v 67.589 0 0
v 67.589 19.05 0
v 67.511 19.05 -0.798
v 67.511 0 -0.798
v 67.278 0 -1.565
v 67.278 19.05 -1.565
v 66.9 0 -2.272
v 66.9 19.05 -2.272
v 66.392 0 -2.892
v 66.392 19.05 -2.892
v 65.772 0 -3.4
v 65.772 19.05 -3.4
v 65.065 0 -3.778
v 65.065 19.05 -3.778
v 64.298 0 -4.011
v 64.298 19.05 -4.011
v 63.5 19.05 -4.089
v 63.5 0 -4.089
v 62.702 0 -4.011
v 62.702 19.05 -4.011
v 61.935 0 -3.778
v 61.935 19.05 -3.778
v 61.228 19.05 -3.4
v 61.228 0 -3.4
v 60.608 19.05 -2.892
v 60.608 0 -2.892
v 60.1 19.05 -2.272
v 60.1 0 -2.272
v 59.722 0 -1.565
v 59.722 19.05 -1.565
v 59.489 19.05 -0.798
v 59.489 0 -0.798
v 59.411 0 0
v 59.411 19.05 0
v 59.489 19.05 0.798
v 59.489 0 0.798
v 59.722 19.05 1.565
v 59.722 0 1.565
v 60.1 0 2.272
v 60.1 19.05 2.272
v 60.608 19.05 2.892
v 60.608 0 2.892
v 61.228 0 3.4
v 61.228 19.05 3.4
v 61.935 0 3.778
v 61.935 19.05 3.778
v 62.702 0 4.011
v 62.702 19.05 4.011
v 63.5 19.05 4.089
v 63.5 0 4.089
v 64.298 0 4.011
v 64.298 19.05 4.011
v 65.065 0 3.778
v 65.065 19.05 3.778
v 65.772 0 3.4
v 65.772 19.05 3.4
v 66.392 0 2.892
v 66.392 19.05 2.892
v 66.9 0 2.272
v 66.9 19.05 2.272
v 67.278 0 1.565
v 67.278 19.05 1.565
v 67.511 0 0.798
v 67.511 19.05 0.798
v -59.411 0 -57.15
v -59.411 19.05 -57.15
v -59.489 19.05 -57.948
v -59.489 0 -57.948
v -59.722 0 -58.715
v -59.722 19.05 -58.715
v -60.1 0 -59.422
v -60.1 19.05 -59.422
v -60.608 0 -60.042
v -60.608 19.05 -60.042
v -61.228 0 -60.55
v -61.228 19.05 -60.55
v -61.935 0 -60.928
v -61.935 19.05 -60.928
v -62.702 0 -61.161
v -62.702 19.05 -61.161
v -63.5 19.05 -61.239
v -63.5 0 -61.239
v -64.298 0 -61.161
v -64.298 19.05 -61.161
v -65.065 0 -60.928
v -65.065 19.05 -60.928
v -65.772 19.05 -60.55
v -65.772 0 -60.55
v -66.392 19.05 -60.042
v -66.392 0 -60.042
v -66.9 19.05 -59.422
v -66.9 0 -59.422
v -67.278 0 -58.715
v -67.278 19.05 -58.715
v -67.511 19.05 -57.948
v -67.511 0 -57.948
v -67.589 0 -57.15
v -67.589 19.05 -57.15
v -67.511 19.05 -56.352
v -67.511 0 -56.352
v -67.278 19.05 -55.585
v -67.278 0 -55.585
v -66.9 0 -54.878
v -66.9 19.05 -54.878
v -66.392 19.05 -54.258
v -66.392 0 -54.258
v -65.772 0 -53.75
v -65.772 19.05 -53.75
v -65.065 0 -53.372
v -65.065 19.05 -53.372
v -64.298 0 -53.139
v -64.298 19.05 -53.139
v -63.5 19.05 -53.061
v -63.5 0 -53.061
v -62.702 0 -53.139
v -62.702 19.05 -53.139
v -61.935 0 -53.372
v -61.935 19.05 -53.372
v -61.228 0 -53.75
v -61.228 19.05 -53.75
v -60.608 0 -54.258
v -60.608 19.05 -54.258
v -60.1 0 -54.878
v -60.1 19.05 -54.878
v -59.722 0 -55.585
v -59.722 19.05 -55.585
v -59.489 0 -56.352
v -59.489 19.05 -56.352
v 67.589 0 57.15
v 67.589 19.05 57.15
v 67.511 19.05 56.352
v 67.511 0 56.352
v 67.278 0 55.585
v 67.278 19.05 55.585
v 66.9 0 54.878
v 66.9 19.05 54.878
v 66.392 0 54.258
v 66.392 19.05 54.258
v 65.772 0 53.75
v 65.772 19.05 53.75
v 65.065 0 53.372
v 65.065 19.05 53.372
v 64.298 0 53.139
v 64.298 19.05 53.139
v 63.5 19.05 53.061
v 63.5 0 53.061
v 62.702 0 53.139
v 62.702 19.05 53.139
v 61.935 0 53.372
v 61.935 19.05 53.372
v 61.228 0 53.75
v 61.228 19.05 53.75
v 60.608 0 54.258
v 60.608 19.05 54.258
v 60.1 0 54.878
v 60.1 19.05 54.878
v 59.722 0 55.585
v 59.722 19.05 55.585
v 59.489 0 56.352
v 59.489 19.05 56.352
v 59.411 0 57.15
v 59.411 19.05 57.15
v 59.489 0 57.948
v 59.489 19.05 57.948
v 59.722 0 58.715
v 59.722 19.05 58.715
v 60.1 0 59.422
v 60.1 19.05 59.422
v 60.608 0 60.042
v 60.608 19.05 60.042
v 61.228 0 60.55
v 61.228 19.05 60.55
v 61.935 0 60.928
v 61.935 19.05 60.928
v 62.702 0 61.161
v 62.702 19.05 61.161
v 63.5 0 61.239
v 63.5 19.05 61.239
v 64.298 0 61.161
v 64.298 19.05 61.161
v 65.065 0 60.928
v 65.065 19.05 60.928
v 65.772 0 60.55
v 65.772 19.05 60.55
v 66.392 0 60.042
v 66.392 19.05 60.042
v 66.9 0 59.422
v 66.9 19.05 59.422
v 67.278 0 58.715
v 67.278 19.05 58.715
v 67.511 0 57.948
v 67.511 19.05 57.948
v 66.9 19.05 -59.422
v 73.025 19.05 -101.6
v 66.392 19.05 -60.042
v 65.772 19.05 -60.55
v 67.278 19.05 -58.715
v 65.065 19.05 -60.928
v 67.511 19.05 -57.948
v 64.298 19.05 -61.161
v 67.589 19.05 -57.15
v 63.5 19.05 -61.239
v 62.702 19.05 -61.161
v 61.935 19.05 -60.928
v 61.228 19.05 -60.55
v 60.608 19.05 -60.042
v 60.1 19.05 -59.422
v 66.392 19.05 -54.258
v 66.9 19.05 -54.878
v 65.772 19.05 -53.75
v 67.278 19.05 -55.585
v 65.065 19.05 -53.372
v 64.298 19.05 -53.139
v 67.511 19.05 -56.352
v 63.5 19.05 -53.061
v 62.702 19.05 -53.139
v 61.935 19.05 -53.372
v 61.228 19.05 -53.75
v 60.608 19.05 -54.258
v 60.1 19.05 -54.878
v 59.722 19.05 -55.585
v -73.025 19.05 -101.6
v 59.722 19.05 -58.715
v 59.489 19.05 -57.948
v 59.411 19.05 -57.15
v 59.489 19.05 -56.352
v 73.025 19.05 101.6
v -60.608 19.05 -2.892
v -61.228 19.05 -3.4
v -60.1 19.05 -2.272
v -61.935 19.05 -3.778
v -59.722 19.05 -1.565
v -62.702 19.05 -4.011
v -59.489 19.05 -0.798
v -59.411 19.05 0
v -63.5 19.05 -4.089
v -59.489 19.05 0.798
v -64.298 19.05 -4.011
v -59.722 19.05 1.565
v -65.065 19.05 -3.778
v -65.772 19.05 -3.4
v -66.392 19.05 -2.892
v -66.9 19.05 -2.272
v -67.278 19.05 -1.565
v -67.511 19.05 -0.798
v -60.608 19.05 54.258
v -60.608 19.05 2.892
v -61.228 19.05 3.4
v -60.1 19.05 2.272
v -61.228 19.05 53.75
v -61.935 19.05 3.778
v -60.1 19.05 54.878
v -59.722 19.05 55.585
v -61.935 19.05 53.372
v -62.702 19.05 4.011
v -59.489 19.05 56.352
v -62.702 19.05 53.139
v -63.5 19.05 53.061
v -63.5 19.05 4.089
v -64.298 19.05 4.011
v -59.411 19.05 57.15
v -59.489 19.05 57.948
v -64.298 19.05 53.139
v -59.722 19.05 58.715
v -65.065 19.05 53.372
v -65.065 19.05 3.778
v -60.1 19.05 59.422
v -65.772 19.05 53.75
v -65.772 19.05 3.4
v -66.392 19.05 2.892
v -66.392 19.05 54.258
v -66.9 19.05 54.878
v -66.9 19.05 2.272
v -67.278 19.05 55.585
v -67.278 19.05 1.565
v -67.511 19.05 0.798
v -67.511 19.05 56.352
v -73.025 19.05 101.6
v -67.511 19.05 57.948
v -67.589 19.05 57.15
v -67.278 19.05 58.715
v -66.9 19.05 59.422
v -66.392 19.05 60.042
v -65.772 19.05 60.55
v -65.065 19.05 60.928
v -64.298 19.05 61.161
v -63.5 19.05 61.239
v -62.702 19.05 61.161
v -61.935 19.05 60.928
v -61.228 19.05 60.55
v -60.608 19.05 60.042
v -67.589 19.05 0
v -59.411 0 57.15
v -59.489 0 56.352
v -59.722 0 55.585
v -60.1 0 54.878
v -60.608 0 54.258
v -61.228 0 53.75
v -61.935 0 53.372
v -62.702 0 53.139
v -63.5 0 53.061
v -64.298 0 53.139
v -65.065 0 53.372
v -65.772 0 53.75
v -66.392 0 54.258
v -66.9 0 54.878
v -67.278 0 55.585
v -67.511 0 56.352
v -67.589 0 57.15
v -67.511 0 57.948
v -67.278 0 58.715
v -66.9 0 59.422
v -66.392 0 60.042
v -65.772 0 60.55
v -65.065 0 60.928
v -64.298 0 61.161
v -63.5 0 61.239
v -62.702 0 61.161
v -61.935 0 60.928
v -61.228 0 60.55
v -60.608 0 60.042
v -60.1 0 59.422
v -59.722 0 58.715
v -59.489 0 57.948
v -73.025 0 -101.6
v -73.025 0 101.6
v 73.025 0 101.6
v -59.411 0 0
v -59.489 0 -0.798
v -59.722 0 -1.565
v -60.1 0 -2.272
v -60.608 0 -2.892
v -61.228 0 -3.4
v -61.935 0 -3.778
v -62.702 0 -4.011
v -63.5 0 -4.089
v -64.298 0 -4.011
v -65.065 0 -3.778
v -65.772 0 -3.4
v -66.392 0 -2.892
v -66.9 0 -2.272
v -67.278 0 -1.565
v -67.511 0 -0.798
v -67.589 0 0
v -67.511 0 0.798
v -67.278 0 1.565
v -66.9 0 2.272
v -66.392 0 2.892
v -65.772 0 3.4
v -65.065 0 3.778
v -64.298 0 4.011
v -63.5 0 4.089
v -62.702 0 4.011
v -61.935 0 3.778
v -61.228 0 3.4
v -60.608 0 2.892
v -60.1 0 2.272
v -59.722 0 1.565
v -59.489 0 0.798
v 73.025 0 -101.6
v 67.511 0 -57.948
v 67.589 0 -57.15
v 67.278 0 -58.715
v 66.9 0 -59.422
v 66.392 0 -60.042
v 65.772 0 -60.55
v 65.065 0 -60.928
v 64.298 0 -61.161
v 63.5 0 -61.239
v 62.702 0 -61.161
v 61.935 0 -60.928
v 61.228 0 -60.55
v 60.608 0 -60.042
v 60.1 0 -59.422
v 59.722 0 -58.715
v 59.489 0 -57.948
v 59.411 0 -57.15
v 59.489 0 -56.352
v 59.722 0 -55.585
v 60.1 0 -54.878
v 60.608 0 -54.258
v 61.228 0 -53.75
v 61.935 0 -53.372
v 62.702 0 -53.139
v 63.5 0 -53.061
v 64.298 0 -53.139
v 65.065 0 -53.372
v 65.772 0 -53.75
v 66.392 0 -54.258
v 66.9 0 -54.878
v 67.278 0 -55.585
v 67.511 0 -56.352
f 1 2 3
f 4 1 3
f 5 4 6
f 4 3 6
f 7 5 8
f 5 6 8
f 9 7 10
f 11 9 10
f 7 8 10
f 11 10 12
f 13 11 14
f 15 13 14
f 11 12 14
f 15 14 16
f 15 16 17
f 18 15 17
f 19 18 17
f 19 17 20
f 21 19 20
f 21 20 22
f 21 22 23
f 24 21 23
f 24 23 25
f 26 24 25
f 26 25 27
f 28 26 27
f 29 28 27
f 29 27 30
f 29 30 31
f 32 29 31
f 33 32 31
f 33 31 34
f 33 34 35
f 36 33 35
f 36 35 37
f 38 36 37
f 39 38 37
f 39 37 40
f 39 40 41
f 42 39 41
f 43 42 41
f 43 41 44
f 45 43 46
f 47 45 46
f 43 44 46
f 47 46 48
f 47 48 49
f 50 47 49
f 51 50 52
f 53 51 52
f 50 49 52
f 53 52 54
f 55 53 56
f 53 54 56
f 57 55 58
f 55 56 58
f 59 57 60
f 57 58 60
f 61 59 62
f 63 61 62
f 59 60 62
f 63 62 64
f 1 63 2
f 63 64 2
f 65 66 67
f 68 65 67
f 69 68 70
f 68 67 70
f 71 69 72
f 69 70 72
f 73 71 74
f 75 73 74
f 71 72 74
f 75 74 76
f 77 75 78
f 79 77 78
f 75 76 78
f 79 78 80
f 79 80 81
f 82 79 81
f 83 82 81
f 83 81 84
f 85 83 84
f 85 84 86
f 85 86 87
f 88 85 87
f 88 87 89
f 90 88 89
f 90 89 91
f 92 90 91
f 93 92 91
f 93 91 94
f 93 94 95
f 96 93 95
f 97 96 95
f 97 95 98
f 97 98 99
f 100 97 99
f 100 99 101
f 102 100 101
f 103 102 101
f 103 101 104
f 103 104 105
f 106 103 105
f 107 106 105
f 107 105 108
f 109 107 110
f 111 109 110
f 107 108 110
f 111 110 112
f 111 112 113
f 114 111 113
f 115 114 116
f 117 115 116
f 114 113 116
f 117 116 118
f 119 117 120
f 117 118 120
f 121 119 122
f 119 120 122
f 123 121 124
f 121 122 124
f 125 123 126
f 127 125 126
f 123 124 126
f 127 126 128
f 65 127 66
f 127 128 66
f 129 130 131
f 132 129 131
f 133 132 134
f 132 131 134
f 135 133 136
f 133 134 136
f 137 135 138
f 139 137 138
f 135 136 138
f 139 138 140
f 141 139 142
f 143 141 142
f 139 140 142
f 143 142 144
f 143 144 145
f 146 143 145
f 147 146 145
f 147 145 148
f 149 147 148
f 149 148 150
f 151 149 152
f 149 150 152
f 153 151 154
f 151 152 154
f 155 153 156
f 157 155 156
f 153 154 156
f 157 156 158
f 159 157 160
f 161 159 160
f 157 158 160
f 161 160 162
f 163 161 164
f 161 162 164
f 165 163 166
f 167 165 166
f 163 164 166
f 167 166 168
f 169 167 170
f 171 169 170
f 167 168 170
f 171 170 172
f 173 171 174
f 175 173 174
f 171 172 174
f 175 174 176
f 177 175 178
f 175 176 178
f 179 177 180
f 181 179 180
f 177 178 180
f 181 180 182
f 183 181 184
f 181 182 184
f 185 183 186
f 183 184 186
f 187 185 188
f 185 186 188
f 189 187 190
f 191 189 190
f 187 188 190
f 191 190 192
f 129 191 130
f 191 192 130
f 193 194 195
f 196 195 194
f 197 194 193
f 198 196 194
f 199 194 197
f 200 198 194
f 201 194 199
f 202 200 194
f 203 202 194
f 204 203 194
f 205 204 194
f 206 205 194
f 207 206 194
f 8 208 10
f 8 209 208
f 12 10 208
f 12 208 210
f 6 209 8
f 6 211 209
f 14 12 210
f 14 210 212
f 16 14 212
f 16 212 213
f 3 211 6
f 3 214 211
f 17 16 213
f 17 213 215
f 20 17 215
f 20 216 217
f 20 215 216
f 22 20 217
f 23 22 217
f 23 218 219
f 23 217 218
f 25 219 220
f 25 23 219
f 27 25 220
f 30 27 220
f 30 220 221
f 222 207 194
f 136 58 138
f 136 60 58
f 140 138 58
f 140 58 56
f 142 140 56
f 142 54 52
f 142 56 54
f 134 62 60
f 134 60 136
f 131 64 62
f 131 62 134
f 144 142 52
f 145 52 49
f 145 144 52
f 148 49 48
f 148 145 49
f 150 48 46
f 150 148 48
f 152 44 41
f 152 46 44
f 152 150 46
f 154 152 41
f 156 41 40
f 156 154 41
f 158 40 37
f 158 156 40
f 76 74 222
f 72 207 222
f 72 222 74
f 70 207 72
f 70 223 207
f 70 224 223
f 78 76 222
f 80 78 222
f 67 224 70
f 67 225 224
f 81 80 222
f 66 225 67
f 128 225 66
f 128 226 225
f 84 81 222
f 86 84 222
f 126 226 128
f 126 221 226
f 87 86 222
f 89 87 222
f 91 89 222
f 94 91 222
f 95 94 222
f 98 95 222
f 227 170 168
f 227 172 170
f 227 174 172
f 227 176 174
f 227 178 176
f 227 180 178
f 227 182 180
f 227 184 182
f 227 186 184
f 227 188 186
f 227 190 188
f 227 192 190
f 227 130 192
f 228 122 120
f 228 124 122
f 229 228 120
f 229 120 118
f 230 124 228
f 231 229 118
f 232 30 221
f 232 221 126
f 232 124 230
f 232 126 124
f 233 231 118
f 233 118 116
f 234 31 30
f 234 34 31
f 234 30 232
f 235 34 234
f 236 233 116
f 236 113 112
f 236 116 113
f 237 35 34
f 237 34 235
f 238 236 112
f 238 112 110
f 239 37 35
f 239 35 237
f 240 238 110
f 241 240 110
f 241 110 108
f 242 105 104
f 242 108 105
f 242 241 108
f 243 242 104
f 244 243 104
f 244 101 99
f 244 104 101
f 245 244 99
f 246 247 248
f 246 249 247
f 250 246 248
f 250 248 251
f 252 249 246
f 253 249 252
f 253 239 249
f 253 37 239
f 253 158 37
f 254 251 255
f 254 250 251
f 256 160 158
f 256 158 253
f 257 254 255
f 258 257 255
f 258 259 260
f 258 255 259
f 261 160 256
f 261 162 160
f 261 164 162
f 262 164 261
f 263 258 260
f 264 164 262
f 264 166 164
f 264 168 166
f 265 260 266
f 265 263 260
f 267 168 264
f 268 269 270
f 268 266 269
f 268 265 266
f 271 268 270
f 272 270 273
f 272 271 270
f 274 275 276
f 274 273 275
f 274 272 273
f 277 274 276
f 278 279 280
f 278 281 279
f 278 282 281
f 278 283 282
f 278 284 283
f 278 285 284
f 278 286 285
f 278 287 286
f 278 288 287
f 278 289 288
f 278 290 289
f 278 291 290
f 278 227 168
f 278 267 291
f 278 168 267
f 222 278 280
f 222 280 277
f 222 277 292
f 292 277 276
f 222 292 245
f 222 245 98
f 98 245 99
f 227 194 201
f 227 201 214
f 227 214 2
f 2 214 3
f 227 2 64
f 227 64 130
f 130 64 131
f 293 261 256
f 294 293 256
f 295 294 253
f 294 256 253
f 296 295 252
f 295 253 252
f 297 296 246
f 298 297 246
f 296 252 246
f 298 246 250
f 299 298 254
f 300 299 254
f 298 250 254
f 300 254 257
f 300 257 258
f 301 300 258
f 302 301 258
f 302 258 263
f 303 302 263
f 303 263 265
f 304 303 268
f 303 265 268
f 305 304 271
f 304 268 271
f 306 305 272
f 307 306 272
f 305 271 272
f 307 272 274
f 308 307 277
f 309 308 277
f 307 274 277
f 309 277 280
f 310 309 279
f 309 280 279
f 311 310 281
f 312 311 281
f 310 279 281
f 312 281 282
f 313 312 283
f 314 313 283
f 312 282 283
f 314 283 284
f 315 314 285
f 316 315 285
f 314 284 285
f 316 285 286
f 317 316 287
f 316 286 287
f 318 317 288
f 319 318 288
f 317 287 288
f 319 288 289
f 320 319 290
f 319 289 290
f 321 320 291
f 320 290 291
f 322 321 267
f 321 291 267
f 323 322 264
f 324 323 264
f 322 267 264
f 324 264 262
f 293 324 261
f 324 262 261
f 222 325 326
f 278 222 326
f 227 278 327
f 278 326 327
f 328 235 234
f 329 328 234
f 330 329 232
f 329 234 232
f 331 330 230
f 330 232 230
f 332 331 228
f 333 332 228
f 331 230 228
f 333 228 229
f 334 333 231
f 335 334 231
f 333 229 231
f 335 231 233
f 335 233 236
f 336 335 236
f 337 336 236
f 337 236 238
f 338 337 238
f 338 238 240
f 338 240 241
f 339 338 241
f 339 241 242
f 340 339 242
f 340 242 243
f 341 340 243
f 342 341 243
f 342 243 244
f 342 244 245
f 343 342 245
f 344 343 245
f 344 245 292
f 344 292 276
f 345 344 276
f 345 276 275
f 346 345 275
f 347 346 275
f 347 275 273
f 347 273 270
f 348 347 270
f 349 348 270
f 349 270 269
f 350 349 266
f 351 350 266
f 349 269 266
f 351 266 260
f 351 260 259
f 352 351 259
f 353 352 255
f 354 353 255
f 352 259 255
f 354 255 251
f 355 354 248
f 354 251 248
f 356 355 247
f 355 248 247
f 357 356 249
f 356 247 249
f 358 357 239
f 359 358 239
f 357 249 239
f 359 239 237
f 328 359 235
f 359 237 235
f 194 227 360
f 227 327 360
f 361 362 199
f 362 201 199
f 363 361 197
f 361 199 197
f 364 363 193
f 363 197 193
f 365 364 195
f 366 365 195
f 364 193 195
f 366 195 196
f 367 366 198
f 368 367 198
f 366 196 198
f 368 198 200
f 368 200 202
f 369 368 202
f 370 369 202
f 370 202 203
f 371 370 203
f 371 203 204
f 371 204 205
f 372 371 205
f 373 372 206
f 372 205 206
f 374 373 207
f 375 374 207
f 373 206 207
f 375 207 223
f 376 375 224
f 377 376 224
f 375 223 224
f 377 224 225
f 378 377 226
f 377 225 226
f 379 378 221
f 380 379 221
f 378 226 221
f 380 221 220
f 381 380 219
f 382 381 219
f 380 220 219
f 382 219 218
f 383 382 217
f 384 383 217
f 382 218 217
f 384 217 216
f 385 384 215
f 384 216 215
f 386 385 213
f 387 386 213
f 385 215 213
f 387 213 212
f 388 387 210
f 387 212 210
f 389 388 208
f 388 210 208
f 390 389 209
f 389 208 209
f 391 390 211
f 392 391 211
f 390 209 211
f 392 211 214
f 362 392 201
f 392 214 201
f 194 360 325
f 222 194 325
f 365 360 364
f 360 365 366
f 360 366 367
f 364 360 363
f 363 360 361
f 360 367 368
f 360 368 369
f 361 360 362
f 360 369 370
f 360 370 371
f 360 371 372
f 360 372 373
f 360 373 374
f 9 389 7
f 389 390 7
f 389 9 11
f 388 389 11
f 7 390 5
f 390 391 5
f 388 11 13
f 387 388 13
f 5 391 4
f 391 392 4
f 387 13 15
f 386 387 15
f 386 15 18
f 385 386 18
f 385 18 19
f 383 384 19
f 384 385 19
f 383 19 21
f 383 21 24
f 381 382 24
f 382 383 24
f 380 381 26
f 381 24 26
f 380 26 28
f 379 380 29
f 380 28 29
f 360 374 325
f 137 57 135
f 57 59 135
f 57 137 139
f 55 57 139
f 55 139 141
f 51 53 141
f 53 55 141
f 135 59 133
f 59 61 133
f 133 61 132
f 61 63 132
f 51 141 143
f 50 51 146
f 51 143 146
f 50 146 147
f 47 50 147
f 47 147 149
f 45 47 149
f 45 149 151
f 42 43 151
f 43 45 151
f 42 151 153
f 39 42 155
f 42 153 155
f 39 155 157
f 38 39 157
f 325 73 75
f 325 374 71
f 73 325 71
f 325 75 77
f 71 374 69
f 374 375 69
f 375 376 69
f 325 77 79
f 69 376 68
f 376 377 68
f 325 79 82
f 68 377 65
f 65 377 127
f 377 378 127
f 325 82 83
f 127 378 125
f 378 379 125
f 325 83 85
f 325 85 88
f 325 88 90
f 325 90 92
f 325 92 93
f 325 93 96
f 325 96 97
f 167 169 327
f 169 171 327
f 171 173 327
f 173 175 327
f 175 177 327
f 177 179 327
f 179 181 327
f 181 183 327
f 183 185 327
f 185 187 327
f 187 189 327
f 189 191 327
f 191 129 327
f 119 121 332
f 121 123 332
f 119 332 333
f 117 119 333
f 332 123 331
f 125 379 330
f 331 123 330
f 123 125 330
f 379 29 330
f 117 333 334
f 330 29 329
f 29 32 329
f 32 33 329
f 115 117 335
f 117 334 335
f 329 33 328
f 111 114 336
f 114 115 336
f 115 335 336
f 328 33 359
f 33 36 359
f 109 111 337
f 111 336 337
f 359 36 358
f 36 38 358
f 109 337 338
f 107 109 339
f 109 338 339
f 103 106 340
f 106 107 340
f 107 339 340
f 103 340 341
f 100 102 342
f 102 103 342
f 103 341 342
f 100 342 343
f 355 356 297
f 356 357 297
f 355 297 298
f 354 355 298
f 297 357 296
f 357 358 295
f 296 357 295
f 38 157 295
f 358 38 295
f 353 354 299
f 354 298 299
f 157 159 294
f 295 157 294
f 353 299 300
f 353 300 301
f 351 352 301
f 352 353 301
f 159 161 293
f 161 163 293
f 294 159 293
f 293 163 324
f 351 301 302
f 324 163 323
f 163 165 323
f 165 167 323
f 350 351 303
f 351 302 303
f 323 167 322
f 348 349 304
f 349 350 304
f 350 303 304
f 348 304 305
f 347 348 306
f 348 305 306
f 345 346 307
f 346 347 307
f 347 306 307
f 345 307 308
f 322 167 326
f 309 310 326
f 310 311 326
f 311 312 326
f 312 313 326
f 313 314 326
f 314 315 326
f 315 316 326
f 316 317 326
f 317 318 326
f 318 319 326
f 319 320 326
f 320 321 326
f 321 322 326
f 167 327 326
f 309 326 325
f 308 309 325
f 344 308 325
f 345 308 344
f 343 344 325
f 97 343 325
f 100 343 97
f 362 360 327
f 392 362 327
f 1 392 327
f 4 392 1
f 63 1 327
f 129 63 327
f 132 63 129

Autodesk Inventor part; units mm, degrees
ref_plane "YZ Plane" through (0, 0, 0) normal (1, 0, 0) x (0, 1, 0)
ref_plane "XZ Plane" through (0, 0, 0) normal (0, 1, 0) x (-1, 0, 0)
ref_plane "XY Plane" through (0, 0, 0) normal (0, 0, 1) x (1, 0, 0)
sketch "Sketch1" plane through (0, 0, 0) normal (0, 1, 0) x (-1, 0, 0)
  line L0 (73.025, 101.6) -> (-73.025, 101.6)
  line L1 (-73.025, 101.6) -> (-73.025, -101.6)
  line L2 (-73.025, -101.6) -> (73.025, -101.6)
  line L3 (73.025, -101.6) -> (73.025, 101.6)
  line L4 (73.025, 101.6) -> (-73.025, -101.6) construction
  line L5 (-73.025, 101.6) -> (73.025, -101.6) construction
  point P0 (0, 0)
  dimension "d0" = 146.05
  dimension "d1" = 203.2
extrude "Extrusion1" add sketch "Sketch1" along normal blind 19.05
sketch "Sketch2" plane through (0, 19.05, 0) normal (0, 1, 0) x (1, 0, 0)
  circle A0 centre (-63.5, -57.15) radius 4.0894
  circle A1 centre (-63.5, 0) radius 4.0894
  circle A2 centre (-63.5, 57.15) radius 4.0894
  circle A3 centre (63.5, -57.15) radius 4.0894
  circle A4 centre (63.5, 0) radius 4.0894
  circle A5 centre (63.5, 57.15) radius 4.0894
  line L0 (-73.025, -101.6) -> (73.025, -101.6) projected
  line L1 (73.025, -101.6) -> (73.025, 101.6) projected
  line L2 (-73.025, 101.6) -> (-73.025, -101.6) projected
  point P0 (0, 0)
  dimension "d4" = 8.1788
  dimension "d5" = 8.1788
  dimension "d6" = 8.1788
  dimension "d7" = 8.1788
  dimension "d8" = 8.1788
  dimension "d9" = 8.1788
  dimension "d10" = 44.45
  dimension "d11" = 101.6
  dimension "d12" = 158.75
  dimension "d13" = 44.45
  dimension "d14" = 101.6
  dimension "d15" = 158.75
  dimension "d16" = 9.525
  dimension "d17" = 9.525
  dimension "d18" = 9.525
  dimension "d19" = 9.525
  dimension "d20" = 9.525
  dimension "d21" = 9.525
extrude "Extrusion2" cut sketch "Sketch2" against normal blind 19.05
properties part number "Part_Back"
